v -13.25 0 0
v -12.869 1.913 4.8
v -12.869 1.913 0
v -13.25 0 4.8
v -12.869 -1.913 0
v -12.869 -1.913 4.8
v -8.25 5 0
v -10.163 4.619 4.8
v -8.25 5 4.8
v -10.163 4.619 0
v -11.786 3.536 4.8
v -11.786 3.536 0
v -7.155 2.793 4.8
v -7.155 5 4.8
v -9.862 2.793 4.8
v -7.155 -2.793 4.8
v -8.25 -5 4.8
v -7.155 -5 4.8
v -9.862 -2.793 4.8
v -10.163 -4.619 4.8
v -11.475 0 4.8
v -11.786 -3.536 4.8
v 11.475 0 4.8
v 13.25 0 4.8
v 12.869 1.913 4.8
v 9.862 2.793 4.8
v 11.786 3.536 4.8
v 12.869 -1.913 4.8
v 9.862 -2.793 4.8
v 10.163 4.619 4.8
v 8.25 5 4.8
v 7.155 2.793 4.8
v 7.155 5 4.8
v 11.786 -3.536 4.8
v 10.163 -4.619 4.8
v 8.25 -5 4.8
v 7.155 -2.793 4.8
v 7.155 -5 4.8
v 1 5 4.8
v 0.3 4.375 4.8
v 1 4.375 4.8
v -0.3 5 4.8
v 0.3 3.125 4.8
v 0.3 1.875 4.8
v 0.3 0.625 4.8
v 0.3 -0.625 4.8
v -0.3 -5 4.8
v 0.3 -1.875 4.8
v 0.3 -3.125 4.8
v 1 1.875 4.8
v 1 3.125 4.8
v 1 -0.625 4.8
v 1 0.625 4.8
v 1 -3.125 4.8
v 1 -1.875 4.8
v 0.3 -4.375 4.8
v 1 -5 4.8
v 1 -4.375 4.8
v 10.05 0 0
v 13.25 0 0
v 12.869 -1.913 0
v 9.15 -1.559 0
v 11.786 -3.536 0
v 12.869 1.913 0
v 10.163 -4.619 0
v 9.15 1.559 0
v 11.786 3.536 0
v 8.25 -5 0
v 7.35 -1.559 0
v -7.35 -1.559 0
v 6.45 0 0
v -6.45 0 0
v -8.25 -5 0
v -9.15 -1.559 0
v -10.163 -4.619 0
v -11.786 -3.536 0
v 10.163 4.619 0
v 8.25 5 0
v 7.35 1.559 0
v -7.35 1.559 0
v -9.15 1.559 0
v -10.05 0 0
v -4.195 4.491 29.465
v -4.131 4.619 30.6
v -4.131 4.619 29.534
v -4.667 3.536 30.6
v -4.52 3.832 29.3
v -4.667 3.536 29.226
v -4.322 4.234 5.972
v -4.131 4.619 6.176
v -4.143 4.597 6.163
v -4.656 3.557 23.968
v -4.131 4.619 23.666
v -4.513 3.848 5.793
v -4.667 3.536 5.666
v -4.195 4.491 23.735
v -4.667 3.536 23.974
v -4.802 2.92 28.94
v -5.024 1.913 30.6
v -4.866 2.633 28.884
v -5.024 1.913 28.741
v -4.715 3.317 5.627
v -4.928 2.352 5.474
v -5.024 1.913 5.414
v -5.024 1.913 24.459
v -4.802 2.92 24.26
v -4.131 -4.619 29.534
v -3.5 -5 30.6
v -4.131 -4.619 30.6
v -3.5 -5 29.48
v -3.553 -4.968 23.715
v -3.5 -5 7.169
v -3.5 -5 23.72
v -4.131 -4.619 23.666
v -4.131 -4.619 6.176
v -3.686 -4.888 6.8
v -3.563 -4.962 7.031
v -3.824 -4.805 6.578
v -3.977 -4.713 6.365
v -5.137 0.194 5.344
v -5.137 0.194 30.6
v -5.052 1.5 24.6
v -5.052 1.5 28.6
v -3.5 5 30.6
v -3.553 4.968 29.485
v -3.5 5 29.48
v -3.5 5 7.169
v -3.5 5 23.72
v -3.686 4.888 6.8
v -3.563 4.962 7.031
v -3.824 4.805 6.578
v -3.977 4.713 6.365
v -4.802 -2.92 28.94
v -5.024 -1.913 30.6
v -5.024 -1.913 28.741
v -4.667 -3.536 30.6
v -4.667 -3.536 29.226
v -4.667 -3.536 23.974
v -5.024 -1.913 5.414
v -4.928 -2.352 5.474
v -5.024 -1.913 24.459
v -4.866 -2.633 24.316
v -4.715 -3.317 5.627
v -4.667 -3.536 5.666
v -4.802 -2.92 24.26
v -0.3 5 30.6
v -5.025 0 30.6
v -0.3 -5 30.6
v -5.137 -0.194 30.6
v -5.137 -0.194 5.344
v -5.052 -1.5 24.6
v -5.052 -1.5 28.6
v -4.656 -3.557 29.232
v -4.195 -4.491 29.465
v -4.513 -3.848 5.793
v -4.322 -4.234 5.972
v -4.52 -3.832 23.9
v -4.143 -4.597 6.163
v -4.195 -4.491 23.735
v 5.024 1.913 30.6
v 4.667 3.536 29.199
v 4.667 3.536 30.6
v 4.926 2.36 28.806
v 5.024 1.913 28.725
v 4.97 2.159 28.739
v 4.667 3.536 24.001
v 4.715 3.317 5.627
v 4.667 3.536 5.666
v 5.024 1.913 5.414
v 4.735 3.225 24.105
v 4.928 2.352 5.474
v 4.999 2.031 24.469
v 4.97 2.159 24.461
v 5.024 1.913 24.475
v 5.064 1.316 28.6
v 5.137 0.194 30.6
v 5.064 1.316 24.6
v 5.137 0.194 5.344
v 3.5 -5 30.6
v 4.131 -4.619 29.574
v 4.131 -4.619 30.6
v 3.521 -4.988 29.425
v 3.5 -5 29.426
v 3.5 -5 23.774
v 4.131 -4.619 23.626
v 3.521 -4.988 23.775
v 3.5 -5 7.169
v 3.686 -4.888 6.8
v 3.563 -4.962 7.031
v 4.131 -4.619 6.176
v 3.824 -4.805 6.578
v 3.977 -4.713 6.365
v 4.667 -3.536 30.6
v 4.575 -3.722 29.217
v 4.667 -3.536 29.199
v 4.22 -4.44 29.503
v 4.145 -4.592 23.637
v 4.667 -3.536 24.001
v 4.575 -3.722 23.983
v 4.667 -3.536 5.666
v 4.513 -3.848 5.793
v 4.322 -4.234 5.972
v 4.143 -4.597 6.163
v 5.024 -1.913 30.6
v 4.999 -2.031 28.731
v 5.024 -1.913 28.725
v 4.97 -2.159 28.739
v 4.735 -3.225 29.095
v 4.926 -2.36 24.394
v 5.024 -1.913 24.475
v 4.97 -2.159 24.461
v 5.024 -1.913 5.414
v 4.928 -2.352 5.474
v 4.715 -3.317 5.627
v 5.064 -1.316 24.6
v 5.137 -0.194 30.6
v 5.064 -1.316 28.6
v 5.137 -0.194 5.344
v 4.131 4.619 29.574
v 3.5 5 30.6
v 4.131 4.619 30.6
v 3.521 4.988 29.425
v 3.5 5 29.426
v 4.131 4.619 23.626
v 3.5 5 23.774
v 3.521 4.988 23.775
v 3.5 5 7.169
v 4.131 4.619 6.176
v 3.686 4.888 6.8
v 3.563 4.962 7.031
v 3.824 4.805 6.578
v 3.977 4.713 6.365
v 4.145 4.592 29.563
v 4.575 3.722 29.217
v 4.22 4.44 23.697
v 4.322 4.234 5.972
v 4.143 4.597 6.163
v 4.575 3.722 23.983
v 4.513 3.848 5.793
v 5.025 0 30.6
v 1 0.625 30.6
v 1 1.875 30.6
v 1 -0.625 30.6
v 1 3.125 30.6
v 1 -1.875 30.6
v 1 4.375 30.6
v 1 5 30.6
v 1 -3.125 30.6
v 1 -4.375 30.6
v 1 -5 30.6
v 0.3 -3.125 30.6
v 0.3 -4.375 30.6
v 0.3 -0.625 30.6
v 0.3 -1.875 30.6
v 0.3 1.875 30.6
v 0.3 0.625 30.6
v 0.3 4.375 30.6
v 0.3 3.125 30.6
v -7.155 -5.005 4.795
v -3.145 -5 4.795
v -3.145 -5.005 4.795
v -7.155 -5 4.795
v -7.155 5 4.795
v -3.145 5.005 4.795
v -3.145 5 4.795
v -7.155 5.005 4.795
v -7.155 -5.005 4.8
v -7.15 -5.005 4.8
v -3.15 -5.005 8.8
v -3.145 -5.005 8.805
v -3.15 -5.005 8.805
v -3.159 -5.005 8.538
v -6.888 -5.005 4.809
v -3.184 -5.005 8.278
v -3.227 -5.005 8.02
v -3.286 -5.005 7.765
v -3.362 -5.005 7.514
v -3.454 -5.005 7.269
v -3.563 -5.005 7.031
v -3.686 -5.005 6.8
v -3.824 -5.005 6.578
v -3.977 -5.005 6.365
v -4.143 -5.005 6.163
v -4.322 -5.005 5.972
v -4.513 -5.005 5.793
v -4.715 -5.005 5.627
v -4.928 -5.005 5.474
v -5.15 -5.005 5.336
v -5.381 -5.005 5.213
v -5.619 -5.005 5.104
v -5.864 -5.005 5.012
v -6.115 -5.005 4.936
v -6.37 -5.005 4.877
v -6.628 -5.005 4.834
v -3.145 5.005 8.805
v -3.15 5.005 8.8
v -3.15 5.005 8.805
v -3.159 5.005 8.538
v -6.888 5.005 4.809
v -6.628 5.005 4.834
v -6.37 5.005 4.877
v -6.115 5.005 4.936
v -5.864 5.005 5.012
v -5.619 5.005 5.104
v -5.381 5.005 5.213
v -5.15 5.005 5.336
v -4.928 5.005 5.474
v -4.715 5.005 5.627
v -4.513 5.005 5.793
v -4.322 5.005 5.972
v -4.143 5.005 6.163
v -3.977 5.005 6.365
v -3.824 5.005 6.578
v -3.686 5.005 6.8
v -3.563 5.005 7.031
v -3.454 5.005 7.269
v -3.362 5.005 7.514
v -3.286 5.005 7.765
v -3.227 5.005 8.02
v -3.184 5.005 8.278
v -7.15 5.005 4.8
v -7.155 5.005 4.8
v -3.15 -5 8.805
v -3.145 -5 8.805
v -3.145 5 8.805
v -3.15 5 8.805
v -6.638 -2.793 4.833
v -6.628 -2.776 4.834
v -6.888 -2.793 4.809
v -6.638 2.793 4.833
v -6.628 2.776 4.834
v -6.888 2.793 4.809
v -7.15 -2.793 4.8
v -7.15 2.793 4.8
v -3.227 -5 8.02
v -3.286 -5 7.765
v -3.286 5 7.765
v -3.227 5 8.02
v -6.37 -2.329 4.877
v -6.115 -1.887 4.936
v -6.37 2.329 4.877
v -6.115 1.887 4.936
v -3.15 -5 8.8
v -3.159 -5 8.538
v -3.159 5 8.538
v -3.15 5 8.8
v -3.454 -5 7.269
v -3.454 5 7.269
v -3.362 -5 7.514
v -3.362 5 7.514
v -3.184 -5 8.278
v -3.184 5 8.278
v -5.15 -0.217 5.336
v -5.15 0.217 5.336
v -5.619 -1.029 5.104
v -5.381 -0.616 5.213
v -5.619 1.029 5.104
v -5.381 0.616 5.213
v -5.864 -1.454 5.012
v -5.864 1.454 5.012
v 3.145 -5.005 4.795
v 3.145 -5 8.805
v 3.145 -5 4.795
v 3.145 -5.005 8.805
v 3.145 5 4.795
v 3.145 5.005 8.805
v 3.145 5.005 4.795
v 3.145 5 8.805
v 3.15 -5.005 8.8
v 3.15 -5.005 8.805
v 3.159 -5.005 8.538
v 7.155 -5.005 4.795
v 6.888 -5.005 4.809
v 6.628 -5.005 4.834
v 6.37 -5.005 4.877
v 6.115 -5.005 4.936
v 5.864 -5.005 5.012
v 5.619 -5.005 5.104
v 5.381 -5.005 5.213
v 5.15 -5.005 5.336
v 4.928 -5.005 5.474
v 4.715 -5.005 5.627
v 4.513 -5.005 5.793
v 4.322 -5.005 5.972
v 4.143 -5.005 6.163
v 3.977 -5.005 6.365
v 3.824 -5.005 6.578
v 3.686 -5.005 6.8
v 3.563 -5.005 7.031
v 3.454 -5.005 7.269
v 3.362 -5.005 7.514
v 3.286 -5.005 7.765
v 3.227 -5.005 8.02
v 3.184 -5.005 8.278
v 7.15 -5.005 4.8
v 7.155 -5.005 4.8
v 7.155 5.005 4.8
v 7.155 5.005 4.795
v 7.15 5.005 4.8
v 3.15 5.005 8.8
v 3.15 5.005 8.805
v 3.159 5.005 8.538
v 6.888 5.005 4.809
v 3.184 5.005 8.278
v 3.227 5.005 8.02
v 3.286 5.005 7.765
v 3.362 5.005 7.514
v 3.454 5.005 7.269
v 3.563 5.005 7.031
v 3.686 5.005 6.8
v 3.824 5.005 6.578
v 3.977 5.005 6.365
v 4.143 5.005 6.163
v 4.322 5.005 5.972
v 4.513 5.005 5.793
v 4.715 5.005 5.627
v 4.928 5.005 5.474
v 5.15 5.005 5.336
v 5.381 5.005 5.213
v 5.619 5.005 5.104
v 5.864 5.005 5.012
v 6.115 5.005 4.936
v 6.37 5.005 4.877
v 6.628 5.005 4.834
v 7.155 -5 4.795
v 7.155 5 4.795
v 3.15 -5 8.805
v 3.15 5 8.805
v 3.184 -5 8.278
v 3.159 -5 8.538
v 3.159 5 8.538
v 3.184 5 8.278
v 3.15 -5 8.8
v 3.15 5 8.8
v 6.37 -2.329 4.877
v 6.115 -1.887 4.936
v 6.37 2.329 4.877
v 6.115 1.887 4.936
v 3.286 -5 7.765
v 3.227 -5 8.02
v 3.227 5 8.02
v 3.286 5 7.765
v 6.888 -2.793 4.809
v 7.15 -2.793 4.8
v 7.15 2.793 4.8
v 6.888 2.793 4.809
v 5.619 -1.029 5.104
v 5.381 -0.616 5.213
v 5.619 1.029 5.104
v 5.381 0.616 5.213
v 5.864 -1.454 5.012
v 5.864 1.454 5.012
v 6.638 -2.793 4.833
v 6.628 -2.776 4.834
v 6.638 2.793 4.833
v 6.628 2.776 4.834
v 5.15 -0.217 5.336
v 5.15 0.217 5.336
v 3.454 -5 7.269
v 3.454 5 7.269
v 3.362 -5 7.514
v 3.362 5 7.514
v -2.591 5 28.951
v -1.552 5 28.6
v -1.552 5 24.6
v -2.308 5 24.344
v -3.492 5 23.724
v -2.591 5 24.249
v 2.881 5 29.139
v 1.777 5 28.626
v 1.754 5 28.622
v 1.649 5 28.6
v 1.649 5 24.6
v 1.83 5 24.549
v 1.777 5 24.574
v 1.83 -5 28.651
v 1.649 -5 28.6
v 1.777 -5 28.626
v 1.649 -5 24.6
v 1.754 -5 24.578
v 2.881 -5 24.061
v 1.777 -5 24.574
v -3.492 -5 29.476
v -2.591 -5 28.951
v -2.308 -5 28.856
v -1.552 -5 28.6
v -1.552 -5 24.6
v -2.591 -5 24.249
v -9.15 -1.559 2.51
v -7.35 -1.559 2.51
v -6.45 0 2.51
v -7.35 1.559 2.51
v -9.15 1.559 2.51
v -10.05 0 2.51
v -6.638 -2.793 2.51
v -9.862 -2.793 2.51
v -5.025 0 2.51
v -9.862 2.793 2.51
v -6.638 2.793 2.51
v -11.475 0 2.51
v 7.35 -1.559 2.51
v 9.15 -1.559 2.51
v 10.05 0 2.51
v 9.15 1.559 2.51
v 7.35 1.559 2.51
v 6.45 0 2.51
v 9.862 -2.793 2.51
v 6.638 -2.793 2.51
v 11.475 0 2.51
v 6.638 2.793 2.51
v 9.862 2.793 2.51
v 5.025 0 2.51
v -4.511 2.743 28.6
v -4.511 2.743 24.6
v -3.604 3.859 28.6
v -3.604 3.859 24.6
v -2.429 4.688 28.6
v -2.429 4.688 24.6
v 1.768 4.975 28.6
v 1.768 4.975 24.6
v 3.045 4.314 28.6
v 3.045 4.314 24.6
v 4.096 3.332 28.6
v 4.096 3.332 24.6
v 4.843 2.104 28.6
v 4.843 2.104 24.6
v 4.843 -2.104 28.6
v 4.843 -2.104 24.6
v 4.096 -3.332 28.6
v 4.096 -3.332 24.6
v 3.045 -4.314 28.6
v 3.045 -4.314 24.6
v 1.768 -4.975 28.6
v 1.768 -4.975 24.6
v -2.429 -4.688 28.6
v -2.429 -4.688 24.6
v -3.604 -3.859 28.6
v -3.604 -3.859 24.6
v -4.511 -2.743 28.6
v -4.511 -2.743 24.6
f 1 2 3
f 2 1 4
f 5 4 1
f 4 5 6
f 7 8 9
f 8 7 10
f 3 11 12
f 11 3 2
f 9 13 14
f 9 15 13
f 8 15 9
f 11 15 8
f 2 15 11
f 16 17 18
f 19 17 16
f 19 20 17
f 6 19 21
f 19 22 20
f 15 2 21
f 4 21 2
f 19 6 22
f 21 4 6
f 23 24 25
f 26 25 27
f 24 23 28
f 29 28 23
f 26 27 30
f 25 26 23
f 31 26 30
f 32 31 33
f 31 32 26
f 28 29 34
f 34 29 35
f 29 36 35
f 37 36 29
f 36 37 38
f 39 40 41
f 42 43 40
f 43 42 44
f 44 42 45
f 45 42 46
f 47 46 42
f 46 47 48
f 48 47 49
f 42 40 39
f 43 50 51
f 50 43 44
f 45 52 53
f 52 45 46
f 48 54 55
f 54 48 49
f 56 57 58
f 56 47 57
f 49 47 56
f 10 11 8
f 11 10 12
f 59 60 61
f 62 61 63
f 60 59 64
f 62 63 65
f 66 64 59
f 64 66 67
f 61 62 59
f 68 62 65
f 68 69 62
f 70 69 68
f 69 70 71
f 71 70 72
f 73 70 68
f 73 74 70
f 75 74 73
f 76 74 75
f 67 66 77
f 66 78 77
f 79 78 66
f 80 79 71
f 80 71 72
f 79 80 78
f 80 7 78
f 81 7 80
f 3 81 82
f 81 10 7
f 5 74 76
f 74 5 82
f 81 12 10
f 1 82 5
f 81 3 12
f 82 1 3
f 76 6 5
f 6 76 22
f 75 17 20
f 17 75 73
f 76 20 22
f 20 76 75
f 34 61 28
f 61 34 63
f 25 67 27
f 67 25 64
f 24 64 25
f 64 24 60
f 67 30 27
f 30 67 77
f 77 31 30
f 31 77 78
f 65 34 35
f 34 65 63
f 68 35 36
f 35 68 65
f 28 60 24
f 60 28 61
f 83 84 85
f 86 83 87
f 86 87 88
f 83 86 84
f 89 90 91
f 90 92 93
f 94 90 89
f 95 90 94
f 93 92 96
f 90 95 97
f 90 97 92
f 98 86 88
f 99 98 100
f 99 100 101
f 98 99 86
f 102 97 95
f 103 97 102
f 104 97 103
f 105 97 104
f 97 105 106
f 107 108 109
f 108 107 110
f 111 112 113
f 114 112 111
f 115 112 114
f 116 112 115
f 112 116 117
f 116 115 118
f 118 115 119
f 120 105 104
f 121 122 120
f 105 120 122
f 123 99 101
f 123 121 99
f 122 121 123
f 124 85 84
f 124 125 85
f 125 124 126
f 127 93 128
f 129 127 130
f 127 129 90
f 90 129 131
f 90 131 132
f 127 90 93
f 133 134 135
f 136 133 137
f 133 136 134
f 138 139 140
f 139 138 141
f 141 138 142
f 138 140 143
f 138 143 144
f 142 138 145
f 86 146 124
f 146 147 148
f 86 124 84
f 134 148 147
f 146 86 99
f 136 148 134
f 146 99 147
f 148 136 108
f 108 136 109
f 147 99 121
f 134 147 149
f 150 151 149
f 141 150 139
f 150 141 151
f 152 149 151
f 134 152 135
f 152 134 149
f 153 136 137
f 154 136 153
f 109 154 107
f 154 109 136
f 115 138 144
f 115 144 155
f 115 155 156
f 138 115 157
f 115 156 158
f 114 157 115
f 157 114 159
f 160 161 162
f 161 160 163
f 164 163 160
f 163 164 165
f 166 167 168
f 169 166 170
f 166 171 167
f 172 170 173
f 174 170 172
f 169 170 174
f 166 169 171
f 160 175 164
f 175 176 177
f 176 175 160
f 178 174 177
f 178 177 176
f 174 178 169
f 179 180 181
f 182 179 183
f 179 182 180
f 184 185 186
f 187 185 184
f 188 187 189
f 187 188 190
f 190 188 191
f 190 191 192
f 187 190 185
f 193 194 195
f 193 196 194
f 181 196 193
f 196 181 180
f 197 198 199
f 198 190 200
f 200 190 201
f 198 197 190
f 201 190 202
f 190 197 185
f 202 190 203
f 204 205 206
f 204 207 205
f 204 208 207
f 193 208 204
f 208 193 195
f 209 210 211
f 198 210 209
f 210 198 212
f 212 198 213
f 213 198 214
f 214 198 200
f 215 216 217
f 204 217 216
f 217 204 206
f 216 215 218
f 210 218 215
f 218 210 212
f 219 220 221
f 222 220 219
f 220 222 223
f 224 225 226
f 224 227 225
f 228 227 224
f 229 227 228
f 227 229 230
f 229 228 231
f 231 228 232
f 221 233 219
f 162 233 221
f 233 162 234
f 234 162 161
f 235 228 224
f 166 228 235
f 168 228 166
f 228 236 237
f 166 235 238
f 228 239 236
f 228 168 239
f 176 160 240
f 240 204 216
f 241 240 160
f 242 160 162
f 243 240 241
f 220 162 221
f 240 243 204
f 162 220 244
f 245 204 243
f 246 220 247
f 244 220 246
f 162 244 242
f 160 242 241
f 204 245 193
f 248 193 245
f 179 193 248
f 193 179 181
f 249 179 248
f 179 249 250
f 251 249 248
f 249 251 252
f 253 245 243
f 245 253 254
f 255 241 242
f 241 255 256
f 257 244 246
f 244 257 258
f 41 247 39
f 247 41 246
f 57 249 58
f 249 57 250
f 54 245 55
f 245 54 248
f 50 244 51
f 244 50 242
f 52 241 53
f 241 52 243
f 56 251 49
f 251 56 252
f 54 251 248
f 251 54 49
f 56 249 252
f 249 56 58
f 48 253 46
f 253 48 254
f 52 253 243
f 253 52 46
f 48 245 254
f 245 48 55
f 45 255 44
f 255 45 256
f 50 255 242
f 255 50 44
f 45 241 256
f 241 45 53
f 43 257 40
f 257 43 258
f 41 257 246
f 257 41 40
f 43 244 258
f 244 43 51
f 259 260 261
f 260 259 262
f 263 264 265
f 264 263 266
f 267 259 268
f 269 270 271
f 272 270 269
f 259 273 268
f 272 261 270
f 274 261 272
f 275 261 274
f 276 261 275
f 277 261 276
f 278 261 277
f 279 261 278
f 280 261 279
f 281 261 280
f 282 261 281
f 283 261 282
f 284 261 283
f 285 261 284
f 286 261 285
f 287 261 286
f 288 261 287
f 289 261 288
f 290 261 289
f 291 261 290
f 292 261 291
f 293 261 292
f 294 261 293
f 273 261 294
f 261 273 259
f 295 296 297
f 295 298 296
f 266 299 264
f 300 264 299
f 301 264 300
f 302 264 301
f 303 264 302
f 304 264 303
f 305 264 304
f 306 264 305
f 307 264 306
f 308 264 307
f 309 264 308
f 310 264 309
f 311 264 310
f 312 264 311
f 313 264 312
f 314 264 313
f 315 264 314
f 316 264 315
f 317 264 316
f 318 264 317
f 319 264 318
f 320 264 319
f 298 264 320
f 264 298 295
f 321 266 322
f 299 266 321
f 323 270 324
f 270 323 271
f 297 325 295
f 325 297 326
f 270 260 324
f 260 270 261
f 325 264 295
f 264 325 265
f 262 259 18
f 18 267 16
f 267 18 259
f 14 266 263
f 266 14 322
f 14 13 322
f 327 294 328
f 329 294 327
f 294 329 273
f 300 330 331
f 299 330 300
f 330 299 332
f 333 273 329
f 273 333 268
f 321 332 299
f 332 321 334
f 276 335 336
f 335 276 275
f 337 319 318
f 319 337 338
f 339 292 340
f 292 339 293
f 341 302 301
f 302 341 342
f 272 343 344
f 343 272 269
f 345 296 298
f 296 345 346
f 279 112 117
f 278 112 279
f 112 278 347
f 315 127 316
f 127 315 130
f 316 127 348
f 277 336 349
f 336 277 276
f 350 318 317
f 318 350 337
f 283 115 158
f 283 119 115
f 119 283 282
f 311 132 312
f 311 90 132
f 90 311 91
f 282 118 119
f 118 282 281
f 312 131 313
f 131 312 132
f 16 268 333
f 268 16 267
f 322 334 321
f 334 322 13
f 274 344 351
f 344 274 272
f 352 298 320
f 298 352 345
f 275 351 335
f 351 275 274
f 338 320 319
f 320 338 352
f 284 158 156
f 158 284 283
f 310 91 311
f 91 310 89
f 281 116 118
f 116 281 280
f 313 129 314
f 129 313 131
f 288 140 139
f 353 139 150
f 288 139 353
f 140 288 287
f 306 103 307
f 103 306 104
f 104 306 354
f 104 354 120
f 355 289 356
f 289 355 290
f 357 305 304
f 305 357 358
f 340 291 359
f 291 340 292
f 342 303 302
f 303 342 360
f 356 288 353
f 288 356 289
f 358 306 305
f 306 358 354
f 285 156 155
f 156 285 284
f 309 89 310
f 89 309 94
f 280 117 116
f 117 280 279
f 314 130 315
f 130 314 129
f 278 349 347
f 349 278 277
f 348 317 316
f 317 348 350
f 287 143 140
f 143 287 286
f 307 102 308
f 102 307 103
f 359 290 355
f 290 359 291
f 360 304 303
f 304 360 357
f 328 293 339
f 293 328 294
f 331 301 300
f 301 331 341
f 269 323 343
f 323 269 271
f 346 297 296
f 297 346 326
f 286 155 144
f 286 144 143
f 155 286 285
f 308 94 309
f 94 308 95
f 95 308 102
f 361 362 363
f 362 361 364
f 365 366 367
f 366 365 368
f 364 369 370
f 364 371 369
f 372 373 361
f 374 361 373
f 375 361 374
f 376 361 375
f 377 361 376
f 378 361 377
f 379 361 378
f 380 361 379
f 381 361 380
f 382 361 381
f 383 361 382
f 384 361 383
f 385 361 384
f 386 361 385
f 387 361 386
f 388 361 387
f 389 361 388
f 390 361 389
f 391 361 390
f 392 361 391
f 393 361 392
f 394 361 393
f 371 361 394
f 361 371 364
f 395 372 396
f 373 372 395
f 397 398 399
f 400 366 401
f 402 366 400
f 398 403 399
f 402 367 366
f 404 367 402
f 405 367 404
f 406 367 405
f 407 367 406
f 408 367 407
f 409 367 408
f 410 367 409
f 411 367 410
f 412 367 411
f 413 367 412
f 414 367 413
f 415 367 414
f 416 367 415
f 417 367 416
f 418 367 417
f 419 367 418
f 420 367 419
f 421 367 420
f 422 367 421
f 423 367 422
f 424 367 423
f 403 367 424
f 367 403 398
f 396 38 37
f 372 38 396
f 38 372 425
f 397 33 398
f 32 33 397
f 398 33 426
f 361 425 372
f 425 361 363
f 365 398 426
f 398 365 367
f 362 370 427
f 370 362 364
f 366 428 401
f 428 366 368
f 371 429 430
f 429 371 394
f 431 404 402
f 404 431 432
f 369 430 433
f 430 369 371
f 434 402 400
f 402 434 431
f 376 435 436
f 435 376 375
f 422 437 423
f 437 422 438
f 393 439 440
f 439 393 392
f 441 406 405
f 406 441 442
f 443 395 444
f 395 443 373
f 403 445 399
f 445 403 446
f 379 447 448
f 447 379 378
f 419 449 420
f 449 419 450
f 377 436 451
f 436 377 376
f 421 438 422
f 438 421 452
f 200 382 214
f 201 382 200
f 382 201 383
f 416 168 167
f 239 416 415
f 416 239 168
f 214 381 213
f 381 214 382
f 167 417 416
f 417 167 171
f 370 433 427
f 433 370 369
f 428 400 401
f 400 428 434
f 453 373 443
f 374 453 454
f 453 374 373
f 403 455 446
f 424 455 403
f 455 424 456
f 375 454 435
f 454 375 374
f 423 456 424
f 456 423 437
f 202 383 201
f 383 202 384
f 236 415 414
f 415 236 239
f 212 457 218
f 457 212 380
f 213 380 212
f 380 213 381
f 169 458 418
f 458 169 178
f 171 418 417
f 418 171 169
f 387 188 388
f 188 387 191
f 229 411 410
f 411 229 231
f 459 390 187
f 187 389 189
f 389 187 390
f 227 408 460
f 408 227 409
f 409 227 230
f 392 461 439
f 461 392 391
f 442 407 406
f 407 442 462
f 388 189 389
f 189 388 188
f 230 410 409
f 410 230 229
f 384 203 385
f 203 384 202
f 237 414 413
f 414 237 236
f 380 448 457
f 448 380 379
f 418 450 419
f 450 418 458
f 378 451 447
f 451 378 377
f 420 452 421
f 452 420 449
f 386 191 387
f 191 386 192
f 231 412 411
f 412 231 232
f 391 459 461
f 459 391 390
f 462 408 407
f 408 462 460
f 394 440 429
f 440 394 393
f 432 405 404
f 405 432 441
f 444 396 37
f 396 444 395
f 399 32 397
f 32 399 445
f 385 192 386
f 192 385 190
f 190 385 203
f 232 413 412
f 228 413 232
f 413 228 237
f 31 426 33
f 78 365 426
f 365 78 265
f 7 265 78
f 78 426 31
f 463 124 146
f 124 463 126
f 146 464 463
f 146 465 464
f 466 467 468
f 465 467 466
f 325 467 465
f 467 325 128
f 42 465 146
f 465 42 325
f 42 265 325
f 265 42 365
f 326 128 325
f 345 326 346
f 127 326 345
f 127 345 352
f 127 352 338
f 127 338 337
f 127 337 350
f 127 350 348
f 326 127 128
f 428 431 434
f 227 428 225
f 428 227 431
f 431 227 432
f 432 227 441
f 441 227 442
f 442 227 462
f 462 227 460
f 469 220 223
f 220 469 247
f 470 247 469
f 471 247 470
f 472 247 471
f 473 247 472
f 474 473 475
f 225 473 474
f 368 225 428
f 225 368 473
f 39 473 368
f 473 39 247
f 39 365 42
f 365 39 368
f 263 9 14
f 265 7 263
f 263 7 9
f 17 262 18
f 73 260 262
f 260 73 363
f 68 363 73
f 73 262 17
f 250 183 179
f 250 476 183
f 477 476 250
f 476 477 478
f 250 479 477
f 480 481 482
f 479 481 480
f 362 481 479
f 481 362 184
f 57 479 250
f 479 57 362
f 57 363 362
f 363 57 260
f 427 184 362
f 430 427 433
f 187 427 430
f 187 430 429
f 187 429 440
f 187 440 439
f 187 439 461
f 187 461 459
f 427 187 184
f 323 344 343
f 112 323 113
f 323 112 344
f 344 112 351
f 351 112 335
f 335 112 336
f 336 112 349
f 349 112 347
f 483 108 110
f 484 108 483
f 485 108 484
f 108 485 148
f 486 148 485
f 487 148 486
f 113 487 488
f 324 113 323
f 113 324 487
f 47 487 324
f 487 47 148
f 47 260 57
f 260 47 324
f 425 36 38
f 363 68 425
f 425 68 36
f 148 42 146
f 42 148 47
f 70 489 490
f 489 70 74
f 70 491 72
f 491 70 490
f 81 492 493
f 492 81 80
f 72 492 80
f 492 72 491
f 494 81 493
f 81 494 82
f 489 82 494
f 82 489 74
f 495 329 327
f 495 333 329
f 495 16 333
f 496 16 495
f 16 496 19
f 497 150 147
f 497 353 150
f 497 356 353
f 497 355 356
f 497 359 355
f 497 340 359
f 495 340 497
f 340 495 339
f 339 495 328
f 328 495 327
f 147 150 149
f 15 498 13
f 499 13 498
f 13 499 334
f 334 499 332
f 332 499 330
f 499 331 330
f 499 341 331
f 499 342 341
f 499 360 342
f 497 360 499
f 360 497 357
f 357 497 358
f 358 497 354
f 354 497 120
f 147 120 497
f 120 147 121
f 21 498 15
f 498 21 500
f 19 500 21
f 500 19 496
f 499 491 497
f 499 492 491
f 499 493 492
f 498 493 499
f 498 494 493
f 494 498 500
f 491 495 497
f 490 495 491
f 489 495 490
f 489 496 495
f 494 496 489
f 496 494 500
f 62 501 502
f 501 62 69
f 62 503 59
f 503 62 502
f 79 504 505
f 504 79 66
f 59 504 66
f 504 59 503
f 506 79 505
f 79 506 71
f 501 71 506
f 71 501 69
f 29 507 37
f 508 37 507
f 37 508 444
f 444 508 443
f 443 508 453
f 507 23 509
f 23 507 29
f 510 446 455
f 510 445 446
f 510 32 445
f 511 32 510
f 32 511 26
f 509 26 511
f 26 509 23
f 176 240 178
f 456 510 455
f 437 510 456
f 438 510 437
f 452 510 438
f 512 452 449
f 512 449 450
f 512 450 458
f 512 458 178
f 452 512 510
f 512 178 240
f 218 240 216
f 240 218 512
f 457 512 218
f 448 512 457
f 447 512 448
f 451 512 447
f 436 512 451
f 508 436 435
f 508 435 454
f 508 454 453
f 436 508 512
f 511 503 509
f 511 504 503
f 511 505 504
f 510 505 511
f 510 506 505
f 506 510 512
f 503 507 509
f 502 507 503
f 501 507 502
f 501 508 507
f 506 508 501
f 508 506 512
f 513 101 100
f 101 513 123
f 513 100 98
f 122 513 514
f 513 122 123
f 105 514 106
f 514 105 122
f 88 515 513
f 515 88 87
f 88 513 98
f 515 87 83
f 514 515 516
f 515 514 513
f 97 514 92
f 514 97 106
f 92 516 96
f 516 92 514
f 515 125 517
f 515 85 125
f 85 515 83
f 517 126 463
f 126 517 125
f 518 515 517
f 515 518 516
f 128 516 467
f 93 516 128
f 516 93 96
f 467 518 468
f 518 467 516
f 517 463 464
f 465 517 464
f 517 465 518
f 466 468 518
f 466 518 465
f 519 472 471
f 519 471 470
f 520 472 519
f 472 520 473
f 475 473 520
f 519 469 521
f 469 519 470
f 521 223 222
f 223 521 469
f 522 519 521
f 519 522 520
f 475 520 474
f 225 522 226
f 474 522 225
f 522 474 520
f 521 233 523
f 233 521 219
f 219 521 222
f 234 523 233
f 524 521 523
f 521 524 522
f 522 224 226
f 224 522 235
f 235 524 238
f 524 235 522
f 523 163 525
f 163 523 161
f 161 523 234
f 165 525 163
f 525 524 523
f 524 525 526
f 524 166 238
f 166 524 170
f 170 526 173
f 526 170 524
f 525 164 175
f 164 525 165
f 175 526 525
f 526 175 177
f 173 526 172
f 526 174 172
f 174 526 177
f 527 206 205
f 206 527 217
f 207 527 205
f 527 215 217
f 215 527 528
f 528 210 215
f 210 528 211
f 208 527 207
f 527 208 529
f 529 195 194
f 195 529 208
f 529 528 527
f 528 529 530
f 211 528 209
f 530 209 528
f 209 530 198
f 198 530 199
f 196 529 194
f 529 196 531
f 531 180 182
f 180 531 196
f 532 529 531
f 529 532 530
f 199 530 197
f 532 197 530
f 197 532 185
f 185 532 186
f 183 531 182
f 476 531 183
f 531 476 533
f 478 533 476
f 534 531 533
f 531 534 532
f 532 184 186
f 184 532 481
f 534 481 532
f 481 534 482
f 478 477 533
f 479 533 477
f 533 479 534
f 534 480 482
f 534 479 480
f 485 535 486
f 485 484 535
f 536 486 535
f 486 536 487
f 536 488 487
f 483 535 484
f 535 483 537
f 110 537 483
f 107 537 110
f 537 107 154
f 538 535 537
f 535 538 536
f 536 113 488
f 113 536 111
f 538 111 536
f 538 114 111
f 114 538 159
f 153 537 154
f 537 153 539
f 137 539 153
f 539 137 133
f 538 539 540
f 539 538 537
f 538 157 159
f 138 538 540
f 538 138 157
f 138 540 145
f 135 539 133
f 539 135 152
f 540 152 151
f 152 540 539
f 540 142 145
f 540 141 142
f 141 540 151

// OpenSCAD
// file: roundEdges.scad
/* roundEdges
 * Copyright (c) 2012 by Krallinger Sebastian [s.krallinger+cc@gmail.com]
 * Dual-licensed under 
 * Creative Commons Attribution-ShareAlike 3.0 (CC BY-SA) [http://creativecommons.org/licenses/by-sa/3.0/]
 * and
 * LGPL v2 or later [http://www.gnu.org/licenses/].
 */


//Rounded Edges
module roundEdge(_a=0,_r=1,_l=1,_fn=100){
	rotate (a=[0,0,_a]){
		translate(v=[_r,_r,0]){
			rotate (a=[0,0,0]) rotate (a=[0,0,180]){
				difference() {
					translate (v=[-OS/2,-OS/2,-OS/2])
						cube (size = [_r+OS,_r+OS,_l+OS],center=false );
					translate (v=[0,0,-OS*2/2])
						cylinder (h = _l+OS*2, r=_r, center = false, $fn=_fn);
				}
			}
		}
	}
}
//roundEdge(_a=0,_l=10);
// file: metric.scad
// PRUSA Mendel  
// Default metric sizes
// GNU GPL v2
// Josef Průša
// josefprusa@me.com
// prusadjs.cz
// http://www.reprap.org/wiki/Prusa_Mendel
// http://github.com/prusajr/PrusaMendel

// RODS

threaded_rod_diameter      = 8.2;
smooth_bar_diameter        = 8;

// Nuts and bolts
// For all nuttraps and screw holse 
m8_diameter                = 8.9;
m8_nut_diameter            = 15.3;
m8_nut_wallDist            = _wallDistFromDia(m8_nut_diameter);
m8_nut_heigth              = 6.3;

m4_diameter                = 4.5;
m4_nut_diameter            = 8.2;
m4_nut_heigth              = 3.2;

m3_diameter                = 3.6;
m3_nut_diameter            = 6.45;
m3_nut_heigth              = 2.3;
m3_nut_wallDist            = _wallDistFromDia(m3_nut_diameter);
m3_nut_diameter_horizontal = 6.1;

// elongetaed nuttraps
// where a nut is put in an slot and inthere hits the perpendicular threadhole
m3_elongNtt_tolerance      = [0.5,0,0.5];// additional [diameter,depth,height]  // depth is not implemented

// linear Bearings
lber_length                = 24;
lber_diam                  = 15.3;

// Motors

motor_shaft                = 5.5;


/******************************************************************************/ 
/*                                  INTERNAL                                  */
/******************************************************************************/
/*-----------------!!! do not change things below this !!!--------------------*/
m3_elongNtt_diameter = m3_nut_diameter + m3_elongNtt_tolerance[0];
m3_elongNtt_wallDist = _wallDistFromDia(m3_elongNtt_diameter);
m3_elongNtt_height = m3_nut_heigth + m3_elongNtt_tolerance[2];



function _wallDistFromDia(dia) = cos(30)*dia;
// file: utilities.scad
/*
 * Utility functions.
 *
 * Originally by Hans Häggström, 2010.
 * Dual licenced under Creative Commons Attribution-Share Alike 3.0 and LGPL2 or later
 */

//include <units.scad>


/******************** Disance Poins ******************************/
function distance3D(a,b) =sqrt( (a[0] - b[0])*(a[0] - b[0]) +
                                (a[1] - b[1])*(a[1] - b[1]) +
                                (a[2] - b[2])*(a[2] - b[2]) );
//Obsolet
function distance(a, b) = distance3D(a,b);

function distance2D(a,b) = sqrt( (a[0] - b[0])*(a[0] - b[0]) +
                                (a[1] - b[1])*(a[1] - b[1]));
								
function distance1D(a,b) = sqrt(a*a+b*b);
//Obsolet
function length2(a) = distance1D(a[0],a[1]);


/************************ vector *************************/
function normalized(a) = a / (max(distance3D([0,0,0], a), 0.00001));

function normalized_axis(a) = a == "x" ? [1, 0, 0]:
                   a == "y" ? [0, 1, 0]:
                   a == "z" ? [0, 0, 1]: normalized(a);

function angleOfNormalizedVector(n) = [0, -atan2(n[2], distance1D([n[0], n[1]])), atan2(n[1], n[0]) ];

function angle(v) = angleOfNormalizedVector(normalized(v));

function angleBetweenTwoPoints(a, b) = angle(normalized(b-a));

function _angleVectore2D(a) = atan2(a[0],a[1]);
function angle_betweentTwoPoints2D (a,b) = _angleVectore2D(b-a);


/********************** Circel ***************************/

function circel_area(r) = PI * r * r;

function circel_radius3Points(a,b,c) = (distance2D(a,b) * distance2D(b,c) * distance2D(c,a)) / (4 * triangle_area3Points(a,b,c));

function circel_radius3lengths(a,b,c) = (a*b*c) / (4 * triangle_area3lengths(a,b,c));


/********************** triangle **************************/
//Satz des Heron
function triangle_area3lengths(a,b,c) = sqrt((a+b+c)*(a+b-c)*(b+c-a)*(c+a-b))/4;

function triangle_area3Points(a,b,c) = triangle_area3lengths(distance2D(a,b),distance2D(b,c),distance2D(c,a));



/************************** coordinate systems translation ****/
//[radius,phi] <=> [x,y]
function conv2D_cartesian2polar(x) = [ distance1D(x[0],x[1]) , atan2(x[1],x[0]) ];
function conv2D_polar2cartesian(x) = [ x[0]*cos(x[1]) , x[0]*sin(x[1]) ];


CENTER = 0;
LEFT = -0.5;
RIGHT = 0.5;
TOP = 0.5;
BOTTOM = -0.5;

FlatCap =0;
ExtendedCap =0.5;
CutCap =-0.5;


module fromTo(from=[0,0,0], to=[1,0,0], size=[1, 1], align=[CENTER, CENTER], material=[0.5, 0.5, 0.5], name="", endExtras=[0,0], endCaps=[FlatCap, FlatCap], rotation=[0,0,0], printString=true) {

  angle = angleBetweenTwoPoints(from, to);
  length = distance(from, to) + endCaps[0]*size[0] + endCaps[1]*size[0] + endExtras[0] + endExtras[1];

  if (length > 0) {
    if (printString) echo(str( "  " ,name, " ", size[0], "mm x ", size[1], "mm, length ", length, "mm"));

    color(material)
      translate(from)
        rotate(angle)
          translate( [ -endCaps[0]*size[0] - endExtras[0], size[0]*(-0.5-align[0]), size[1]*(-0.5+align[1]) ] )
            rotate(rotation)
              scale([length, size[0], size[1]]) child();
  }
}

module part(name) {
  echo("");
  echo(str(name, ":"));
}
// file: units.scad
/*
 * Basic units.
 * 
 * Originally by Hans Häggström, 2010.
 * Dual licenced under Creative Commons Attribution-Share Alike 3.0 and LGPL2 or later
 */


mm = 1;
cm = 10 * mm;
dm = 100 * mm;
m = 1000 * mm;

inch = 25.4 * mm;

X = [1, 0, 0];
Y = [0, 1, 0];
Z = [0, 0, 1];

M3 = 3*mm;
M4 = 4*mm;
M5 = 5*mm;
M6 = 6*mm;
M8 = 8*mm;


// When a small distance is needed to overlap shapes for boolean cutting, etc.
epsilon = 0.01*mm;
OS = epsilon;  // Over size
// file: config.scad
/* config [c]
 * Copyright (c) 2012 by Krallinger Sebastian [s.krallinger+cc@gmail.com]
 * Dual-licensed under 
 * Creative Commons Attribution-ShareAlike 3.0 (CC BY-SA) [http://creativecommons.org/licenses/by-sa/3.0/]
 * and
 * LGPL v2 or later [http://www.gnu.org/licenses/].
 */

/******************************************************************************/ 
/*                              Main configuration                            */
/******************************************************************************/

/*-----------------------------------x axis-----------------------------------*/
c_x_axis_length = 333; // usable lenth. If you use an extruder which is longer then the H-Xtruder-Mount.scad you have to add this overcut here.
c_x_axis_smoothRod_diam = 8.1;

c_x_axis_dist = 35;

/*-----------------------------------y axis-----------------------------------*/
c_y_axis_length = 333; // usable lenth. If your extruder nozzel exit is not center to the H-Xtruder-Mount.scad you have to add the offset here.
c_y_axis_smoothRod_diam = 8.1;
c_y_axis_tabel_zDirOffset = 14.321; // offset of the center of the y axis to the tabel contact plain

/*-----------------------------------z axis-----------------------------------*/
c_z_axis_length = 333; // usable lenth. If the nozzel of the extruder exids the lower edge of the H-X-Carriage.scad than you have to add the overcut here.
c_z_axis_smoothRod_diam = 12.2;

c_z_axis_rodsDist = 32; // distance between threded rod and smooth rod

/******************************************************************************/ 
/*                                  linear Bearings                           */
/******************************************************************************/
c_lber_length       = 24.2;
c_lber_diam         = 15.3;

/*-----------------------------------x axis-----------------------------------*/
c_xAxis_lber_length = c_lber_length;
c_xAxis_lber_diam   = c_lber_diam;
/*----------------------------------y axis------------------------------------*/
c_yAxis_lber_length = c_lber_length;
c_yAxis_lber_diam   = c_lber_diam;
/*----------------------------------z axis------------------------------------*/
c_zAxis_lber_length = c_lber_length;
c_zAxis_lber_diam   = 12 + c_lber_diam-8;

/******************************************************************************/ 
/*                                    BELT                                    */
/******************************************************************************/
c_belt_thickness      = 1.3;
c_belt_width          = 6;
c_belt_teethDist      = 2.5;
c_belt_teethDepth     = 0.7;

/*-----------------------------------x axis-----------------------------------*/
//belt
c_xAxis_belt_thickness      = c_belt_thickness;
c_xAxis_belt_width          = c_belt_width;
c_xAxis_belt_teethDist      = c_belt_teethDist;
c_xAxis_belt_teethDepth     = c_belt_teethDepth;

// pully
c_xAxis_pully_diam = 9-c_xAxis_belt_thickness*2; // innes (in the teeth molde) diameter of the pully

// diviater
c_xAxis_bearingDiviater_diam = 26; // diameter of the diviater (so the diameter of the centerpoint to the teeth top of the belt) 

// distances
c_xAxis_beltCenter_xAxisDist     = 38;
c_xAxis_beltCenter_motorScrewHoleDist     = 12;

c_xAxis_beltTop_topxAxisDist = -(c_x_axis_dist/2)+c_xAxis_pully_diam/2; // distece between center of the top x axis and toothed side of the belt in z dir

/*-----------------------------------y axis-----------------------------------*/
c_yAxis_belt_thickness      = c_belt_thickness;
c_yAxis_belt_width          = c_belt_width;
c_yAxis_belt_teethDist      = c_belt_teethDist;
c_yAxis_belt_teethDepth     = c_belt_teethDepth;

c_y_axis_beltCenter_zDirOffset = 14.6; // offset of the center of the belt to the tabel contact plain

/******************************************************************************/ 
/*                                  support                                   */
/******************************************************************************/
c_xDirSupp_thredRod_altitude    = [8.266,45.497];
c_xDirSupp_thredRod_zAxisDist   = 38.95-8.5;

/******************************************************************************/ 
/*                                  motor                                     */
/******************************************************************************/
c_motorShaft_diam            = 5; // motor axis diameter
c_motorShaft_length          = 25; // motor axis length from pilot
c_motorPilot_diam            = 27.5; // motor pilot diameter
c_motorScrewHole_diam        = 3.3; // motor screw holde diameter
c_motorScrewHoles_centerDist = 43.841/2; // motor holes distance from axis center
c_motor_sideLength           = 42.1; // length of the motor side (rectangular motor)

/*-----------------------------------x axis-----------------------------------*/
c_xAxis_motorShaft_diam            = c_motorShaft_diam;
c_xAxis_motorShaft_length          = c_motorShaft_length;
c_xAxis_motorPilot_diam            = c_motorPilot_diam ;
c_xAxis_motorScrewHole_diam        = c_motorScrewHole_diam ;
c_xAxis_motorScrewHoles_centerDist = c_motorScrewHoles_centerDist;
c_xAxis_motor_sideLength           = c_motor_sideLength;

/*-----------------------------------y axis-----------------------------------*/
c_yAxis_motorShaft_diam            = c_motorShaft_diam;
c_yAxis_motorShaft_length          = c_motorShaft_length;
c_yAxis_motorPilot_diam            = c_motorPilot_diam ;
c_yAxis_motorScrewHole_diam        = c_motorScrewHole_diam ;
c_yAxis_motorScrewHoles_centerDist = c_motorScrewHoles_centerDist;
c_yAxis_motor_sideLength           = c_motor_sideLength;

/*-----------------------------------z axis-----------------------------------*/
c_zAxis_motorShaft_diam            = c_motorShaft_diam;
c_zAxis_motorShaft_length          = c_motorShaft_length;
c_zAxis_motorPilot_diam            = c_motorPilot_diam ;
c_zAxis_motorScrewHole_diam        = c_motorScrewHole_diam ;
c_zAxis_motorScrewHoles_centerDist = c_motorScrewHoles_centerDist;
c_zAxis_motor_sideLength           = c_motor_sideLength;
// main file
/* H-Y-BeltClamp_Alternativ [Ybdaa]
 * Copyright (c) 2012 by Krallinger Sebastian [s.krallinger+cc@gmail.com]
 * Dual-licensed under
 * Creative Commons Attribution-ShareAlike 3.0 (CC BY-SA) [http://creativecommons.org/licenses/by-sa/3.0/]
 * and
 * LGPL v2 or later [http://www.gnu.org/licenses/].
 */

include <config.scad>
include <units.scad>
include <utilities.scad>
include <metric.scad>

include <roundEdges.scad>



/*------------------------------------general---------------------------------*/
Ybda_mode = "-";
//Ybda_mode = "print";  $fn=24*4;   // can be print or inspect [overlays the Ybda_model with the original Ybda_model] (uncomment next line)
//Ybda_mode = "printSet";  $fn=24*4;
Ybda_mode = "inspect";
//Ybda_mode = "assembly";


Ybda_thinWallThickness   = 1;
Ybda_genWallThickness    = 2.5;
Ybda_strongWallThickness = 10;

Ybda_reinforcement_r = 4;

/*------------------------------------belt------------------------------------*/
Ybda_belt_thickness      = c_yAxis_belt_thickness;
Ybda_belt_width          = c_yAxis_belt_width;
Ybda_belt_teethDist      = c_yAxis_belt_teethDist;
Ybda_belt_teethDepth     = c_yAxis_belt_teethDepth;
Ybda_belt_topOffset      = c_y_axis_beltCenter_zDirOffset;  // from top plate to the top edge of the belt
Ybda_belt_tolerance      = [2,1]; //w,t

/*------------------------------------zip ties--------------------------------*/
Ybda_zipTies_width       = 4;
Ybda_zipTies_thickness   = 2;


/*------------------------------------internal--------------------------------*/
_Ybda_base_size = [Ybda_genWallThickness*2+ Ybda_belt_thickness*2 + Ybda_belt_tolerance[1]*2 + m3_nut_diameter*2 + 4* Ybda_thinWallThickness,
				   Ybda_strongWallThickness,
				   Ybda_genWallThickness+m3_nut_heigth];

_Ybda_clamp_heigt = Ybda_belt_topOffset + Ybda_belt_width + Ybda_belt_tolerance[1] + Ybda_zipTies_width + 2*Ybda_genWallThickness;

_Ybda_teeth_dist = (Ybda_belt_thickness- Ybda_belt_teethDepth);

module H_yBeltClam_alt(HasFoot = true) {
	difference() {
		union(){
			if (HasFoot)
			for (i=[-(_Ybda_base_size[0]-Ybda_strongWallThickness)/2, (_Ybda_base_size[0]-Ybda_strongWallThickness)/2]){
				translate([i, 0, 0])
				cylinder(r=_Ybda_base_size[1]/2, h=_Ybda_base_size[2], center=false);
			}

			if (HasFoot)
			translate([0, 0, _Ybda_base_size[2]/2])
				cube(size=_Ybda_base_size- [_Ybda_base_size[1],0,0], center=true);

			// outer clamp
			translate([(_Ybda_teeth_dist/2+Ybda_belt_teethDepth+Ybda_genWallThickness/2) * 1, 0, _Ybda_clamp_heigt/2])
				cube(size=[Ybda_genWallThickness, Ybda_strongWallThickness, _Ybda_clamp_heigt], center=true);
			translate([(_Ybda_teeth_dist/2+Ybda_genWallThickness/2 + Ybda_belt_teethDepth/2) * -1, 0, _Ybda_clamp_heigt/2])
				cube(size=[Ybda_genWallThickness + Ybda_belt_teethDepth, Ybda_strongWallThickness, _Ybda_clamp_heigt], center=true);

			// clamp support
			for (i=[-1,1])
			translate([(_Ybda_teeth_dist/2+Ybda_belt_teethDepth+Ybda_genWallThickness) * i, 0, 0])
			scale([0.33, 1, 1])
				cylinder(r=Ybda_strongWallThickness/2, h=_Ybda_clamp_heigt, center=false);

			// belt teeth conector
			for (y=[-Ybda_strongWallThickness/2+ Ybda_belt_teethDist/2:Ybda_belt_teethDist:Ybda_strongWallThickness/2- Ybda_belt_teethDepth/2])
			translate([(_Ybda_teeth_dist/2 + Ybda_belt_teethDepth/2), y, _Ybda_clamp_heigt/2])
				cube(size=[Ybda_belt_teethDepth, Ybda_belt_teethDist/2, _Ybda_clamp_heigt], center=true);


			if (HasFoot)
			for (i=[[-1,90],[1,0]])
			translate([(Ybda_belt_thickness/2+Ybda_genWallThickness)*i[0],_Ybda_base_size[1]/2, _Ybda_base_size[2]])
			rotate(a=90,v=X)
			 roundEdge(_a=i[1],_r=Ybda_reinforcement_r,_l=_Ybda_base_size[1],_fn=48*2);
		}
		union(){
			if (HasFoot)
			for (i=[-(_Ybda_base_size[0]-Ybda_strongWallThickness)/2, (_Ybda_base_size[0]-Ybda_strongWallThickness)/2])
			translate([i, 0, 0]) {
				translate([0, 0, -OS])
					cylinder(r=m3_diameter/2, h=_Ybda_base_size[2]+2*OS, center=false);

				translate([0, 0, _Ybda_base_size[2]-m3_nut_heigth+OS])
					cylinder(r=m3_nut_diameter/2, h=_Ybda_clamp_heigt, center=false,$fn=6);
			}

			//zip tie coutout
			translate([0, 0, _Ybda_clamp_heigt- Ybda_thinWallThickness - Ybda_zipTies_width*0.75]) {
				rotate_extrude(convexity = 10)
				translate([ distance1D(Ybda_strongWallThickness/2,Ybda_belt_thickness+Ybda_genWallThickness)- Ybda_zipTies_thickness/2,0, 0])
				rotate(a=-90,v=Z)
				polygon(points=[[-Ybda_zipTies_width/2,0],[Ybda_zipTies_width/2,0],[Ybda_zipTies_width,Ybda_zipTies_thickness],[-Ybda_zipTies_width,Ybda_zipTies_thickness],[-Ybda_zipTies_width/2,0]]);
				*difference() {


					cylinder(r=Ybda_strongWallThickness, h=Ybda_zipTies_thickness+2*OS, center=true);
					cylinder(r=distance1D(Ybda_strongWallThickness/2,Ybda_belt_thickness+Ybda_genWallThickness)- Ybda_zipTies_thickness/2, h=Ybda_zipTies_width, center=true);
				}
			}
		}
	}

}


if (Ybda_mode == "inspect") {
	H_yBeltClam_alt();
}

module H_yBeltClam_alt_prinSet() {
	for (i=[-Ybda_strongWallThickness/2-0.5,+Ybda_strongWallThickness/2+0.5])
	translate([0, i, 0])
	H_yBeltClam_alt();
}
if (Ybda_mode == "printSet") {
	H_yBeltClam_alt_prinSet();
}

module H_yBeltClam_alt_print() {
	H_yBeltClam_alt();
}
if (Ybda_mode == "print") {
	H_yBeltClam_alt_print();
}
